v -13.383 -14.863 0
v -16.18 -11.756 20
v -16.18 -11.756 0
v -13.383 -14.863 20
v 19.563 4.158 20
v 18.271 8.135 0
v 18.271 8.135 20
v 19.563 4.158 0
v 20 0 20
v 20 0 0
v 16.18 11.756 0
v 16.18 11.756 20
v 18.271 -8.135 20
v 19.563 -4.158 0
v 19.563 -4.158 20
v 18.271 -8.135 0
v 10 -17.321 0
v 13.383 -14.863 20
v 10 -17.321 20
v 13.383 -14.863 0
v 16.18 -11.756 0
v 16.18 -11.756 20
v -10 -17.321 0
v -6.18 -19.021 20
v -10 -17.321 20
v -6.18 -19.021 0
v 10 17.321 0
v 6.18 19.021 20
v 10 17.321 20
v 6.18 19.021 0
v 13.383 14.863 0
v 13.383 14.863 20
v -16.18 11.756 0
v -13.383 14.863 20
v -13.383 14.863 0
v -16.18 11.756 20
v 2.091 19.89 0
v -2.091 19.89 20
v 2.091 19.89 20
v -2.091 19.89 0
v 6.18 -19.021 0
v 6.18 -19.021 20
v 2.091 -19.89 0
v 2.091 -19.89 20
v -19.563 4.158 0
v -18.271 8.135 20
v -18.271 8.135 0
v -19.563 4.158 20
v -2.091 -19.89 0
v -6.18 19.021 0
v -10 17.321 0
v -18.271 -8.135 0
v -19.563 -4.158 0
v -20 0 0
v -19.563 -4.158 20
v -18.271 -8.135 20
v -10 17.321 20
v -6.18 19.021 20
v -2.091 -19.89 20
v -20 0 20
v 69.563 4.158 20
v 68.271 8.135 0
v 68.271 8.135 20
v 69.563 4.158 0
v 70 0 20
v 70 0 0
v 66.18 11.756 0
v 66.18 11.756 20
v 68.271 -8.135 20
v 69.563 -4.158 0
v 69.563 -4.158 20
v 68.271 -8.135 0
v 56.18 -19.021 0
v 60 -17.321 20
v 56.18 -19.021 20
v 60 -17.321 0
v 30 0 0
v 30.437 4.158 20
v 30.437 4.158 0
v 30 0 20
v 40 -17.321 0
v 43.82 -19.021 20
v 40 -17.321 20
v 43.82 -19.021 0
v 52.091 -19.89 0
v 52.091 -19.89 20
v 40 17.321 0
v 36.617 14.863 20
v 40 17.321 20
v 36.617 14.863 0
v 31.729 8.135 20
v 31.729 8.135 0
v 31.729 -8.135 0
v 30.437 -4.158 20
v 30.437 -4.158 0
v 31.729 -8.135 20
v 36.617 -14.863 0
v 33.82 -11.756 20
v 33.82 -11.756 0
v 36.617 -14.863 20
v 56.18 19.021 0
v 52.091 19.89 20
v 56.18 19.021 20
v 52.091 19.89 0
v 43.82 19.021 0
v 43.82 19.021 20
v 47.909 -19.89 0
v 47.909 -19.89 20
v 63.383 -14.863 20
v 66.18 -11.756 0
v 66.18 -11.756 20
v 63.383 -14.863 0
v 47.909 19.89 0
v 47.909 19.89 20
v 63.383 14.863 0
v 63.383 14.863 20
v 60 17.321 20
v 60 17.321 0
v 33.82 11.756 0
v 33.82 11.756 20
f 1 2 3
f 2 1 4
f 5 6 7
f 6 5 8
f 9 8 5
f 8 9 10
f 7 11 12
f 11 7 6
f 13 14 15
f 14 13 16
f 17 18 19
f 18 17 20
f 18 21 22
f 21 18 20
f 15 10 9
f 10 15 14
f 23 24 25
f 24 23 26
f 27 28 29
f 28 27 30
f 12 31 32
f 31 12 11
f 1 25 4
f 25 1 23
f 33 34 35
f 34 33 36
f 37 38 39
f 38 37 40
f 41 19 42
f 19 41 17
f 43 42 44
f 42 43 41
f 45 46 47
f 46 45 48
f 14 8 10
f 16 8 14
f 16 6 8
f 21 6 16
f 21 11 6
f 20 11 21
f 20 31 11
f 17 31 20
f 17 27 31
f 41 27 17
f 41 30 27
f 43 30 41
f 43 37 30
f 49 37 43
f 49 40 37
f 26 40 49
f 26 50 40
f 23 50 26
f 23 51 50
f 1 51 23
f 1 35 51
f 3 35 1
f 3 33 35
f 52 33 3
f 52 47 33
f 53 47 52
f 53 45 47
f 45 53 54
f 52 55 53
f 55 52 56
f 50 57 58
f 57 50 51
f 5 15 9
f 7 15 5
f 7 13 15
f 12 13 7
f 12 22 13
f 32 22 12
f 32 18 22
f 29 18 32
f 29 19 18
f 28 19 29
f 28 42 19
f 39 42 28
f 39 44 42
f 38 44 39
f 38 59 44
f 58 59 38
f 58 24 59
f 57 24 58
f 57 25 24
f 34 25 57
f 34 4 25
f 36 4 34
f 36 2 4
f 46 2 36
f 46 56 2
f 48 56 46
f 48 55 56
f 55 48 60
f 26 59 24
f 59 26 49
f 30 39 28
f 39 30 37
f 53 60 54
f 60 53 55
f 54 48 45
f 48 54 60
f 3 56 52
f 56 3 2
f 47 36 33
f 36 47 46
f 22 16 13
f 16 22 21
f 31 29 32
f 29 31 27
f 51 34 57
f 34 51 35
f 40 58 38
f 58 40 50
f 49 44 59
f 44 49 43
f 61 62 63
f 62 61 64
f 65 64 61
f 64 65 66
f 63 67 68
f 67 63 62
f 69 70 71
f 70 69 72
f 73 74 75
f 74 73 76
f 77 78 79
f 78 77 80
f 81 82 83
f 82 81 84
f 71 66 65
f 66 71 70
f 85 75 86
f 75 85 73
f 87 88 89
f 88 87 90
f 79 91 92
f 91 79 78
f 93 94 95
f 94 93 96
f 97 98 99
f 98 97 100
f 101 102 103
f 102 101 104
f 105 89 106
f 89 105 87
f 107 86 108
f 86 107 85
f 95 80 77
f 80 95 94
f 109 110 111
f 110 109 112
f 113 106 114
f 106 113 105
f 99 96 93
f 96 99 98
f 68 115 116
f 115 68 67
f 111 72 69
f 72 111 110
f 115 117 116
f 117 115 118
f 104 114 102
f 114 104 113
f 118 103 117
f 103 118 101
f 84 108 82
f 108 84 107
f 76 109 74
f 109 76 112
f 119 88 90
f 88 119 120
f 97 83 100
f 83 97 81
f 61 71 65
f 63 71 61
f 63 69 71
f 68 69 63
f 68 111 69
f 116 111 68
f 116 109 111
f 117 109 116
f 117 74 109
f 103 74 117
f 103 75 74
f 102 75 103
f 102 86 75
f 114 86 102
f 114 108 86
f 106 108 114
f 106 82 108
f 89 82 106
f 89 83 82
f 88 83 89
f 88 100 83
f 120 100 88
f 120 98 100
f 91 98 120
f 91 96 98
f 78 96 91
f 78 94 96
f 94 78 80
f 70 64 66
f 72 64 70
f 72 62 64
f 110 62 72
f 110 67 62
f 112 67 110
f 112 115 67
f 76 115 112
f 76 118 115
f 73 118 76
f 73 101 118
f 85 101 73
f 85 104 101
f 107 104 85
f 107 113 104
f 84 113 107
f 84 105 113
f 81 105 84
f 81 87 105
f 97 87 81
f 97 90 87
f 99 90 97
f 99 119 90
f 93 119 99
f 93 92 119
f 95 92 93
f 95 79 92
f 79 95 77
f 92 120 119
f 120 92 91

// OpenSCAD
//Operatii cu variabile

x=10;
cylinder (h=20,r=x);

x=20;
translate ([50,0,0]) cylinder (h=20,r=x);
